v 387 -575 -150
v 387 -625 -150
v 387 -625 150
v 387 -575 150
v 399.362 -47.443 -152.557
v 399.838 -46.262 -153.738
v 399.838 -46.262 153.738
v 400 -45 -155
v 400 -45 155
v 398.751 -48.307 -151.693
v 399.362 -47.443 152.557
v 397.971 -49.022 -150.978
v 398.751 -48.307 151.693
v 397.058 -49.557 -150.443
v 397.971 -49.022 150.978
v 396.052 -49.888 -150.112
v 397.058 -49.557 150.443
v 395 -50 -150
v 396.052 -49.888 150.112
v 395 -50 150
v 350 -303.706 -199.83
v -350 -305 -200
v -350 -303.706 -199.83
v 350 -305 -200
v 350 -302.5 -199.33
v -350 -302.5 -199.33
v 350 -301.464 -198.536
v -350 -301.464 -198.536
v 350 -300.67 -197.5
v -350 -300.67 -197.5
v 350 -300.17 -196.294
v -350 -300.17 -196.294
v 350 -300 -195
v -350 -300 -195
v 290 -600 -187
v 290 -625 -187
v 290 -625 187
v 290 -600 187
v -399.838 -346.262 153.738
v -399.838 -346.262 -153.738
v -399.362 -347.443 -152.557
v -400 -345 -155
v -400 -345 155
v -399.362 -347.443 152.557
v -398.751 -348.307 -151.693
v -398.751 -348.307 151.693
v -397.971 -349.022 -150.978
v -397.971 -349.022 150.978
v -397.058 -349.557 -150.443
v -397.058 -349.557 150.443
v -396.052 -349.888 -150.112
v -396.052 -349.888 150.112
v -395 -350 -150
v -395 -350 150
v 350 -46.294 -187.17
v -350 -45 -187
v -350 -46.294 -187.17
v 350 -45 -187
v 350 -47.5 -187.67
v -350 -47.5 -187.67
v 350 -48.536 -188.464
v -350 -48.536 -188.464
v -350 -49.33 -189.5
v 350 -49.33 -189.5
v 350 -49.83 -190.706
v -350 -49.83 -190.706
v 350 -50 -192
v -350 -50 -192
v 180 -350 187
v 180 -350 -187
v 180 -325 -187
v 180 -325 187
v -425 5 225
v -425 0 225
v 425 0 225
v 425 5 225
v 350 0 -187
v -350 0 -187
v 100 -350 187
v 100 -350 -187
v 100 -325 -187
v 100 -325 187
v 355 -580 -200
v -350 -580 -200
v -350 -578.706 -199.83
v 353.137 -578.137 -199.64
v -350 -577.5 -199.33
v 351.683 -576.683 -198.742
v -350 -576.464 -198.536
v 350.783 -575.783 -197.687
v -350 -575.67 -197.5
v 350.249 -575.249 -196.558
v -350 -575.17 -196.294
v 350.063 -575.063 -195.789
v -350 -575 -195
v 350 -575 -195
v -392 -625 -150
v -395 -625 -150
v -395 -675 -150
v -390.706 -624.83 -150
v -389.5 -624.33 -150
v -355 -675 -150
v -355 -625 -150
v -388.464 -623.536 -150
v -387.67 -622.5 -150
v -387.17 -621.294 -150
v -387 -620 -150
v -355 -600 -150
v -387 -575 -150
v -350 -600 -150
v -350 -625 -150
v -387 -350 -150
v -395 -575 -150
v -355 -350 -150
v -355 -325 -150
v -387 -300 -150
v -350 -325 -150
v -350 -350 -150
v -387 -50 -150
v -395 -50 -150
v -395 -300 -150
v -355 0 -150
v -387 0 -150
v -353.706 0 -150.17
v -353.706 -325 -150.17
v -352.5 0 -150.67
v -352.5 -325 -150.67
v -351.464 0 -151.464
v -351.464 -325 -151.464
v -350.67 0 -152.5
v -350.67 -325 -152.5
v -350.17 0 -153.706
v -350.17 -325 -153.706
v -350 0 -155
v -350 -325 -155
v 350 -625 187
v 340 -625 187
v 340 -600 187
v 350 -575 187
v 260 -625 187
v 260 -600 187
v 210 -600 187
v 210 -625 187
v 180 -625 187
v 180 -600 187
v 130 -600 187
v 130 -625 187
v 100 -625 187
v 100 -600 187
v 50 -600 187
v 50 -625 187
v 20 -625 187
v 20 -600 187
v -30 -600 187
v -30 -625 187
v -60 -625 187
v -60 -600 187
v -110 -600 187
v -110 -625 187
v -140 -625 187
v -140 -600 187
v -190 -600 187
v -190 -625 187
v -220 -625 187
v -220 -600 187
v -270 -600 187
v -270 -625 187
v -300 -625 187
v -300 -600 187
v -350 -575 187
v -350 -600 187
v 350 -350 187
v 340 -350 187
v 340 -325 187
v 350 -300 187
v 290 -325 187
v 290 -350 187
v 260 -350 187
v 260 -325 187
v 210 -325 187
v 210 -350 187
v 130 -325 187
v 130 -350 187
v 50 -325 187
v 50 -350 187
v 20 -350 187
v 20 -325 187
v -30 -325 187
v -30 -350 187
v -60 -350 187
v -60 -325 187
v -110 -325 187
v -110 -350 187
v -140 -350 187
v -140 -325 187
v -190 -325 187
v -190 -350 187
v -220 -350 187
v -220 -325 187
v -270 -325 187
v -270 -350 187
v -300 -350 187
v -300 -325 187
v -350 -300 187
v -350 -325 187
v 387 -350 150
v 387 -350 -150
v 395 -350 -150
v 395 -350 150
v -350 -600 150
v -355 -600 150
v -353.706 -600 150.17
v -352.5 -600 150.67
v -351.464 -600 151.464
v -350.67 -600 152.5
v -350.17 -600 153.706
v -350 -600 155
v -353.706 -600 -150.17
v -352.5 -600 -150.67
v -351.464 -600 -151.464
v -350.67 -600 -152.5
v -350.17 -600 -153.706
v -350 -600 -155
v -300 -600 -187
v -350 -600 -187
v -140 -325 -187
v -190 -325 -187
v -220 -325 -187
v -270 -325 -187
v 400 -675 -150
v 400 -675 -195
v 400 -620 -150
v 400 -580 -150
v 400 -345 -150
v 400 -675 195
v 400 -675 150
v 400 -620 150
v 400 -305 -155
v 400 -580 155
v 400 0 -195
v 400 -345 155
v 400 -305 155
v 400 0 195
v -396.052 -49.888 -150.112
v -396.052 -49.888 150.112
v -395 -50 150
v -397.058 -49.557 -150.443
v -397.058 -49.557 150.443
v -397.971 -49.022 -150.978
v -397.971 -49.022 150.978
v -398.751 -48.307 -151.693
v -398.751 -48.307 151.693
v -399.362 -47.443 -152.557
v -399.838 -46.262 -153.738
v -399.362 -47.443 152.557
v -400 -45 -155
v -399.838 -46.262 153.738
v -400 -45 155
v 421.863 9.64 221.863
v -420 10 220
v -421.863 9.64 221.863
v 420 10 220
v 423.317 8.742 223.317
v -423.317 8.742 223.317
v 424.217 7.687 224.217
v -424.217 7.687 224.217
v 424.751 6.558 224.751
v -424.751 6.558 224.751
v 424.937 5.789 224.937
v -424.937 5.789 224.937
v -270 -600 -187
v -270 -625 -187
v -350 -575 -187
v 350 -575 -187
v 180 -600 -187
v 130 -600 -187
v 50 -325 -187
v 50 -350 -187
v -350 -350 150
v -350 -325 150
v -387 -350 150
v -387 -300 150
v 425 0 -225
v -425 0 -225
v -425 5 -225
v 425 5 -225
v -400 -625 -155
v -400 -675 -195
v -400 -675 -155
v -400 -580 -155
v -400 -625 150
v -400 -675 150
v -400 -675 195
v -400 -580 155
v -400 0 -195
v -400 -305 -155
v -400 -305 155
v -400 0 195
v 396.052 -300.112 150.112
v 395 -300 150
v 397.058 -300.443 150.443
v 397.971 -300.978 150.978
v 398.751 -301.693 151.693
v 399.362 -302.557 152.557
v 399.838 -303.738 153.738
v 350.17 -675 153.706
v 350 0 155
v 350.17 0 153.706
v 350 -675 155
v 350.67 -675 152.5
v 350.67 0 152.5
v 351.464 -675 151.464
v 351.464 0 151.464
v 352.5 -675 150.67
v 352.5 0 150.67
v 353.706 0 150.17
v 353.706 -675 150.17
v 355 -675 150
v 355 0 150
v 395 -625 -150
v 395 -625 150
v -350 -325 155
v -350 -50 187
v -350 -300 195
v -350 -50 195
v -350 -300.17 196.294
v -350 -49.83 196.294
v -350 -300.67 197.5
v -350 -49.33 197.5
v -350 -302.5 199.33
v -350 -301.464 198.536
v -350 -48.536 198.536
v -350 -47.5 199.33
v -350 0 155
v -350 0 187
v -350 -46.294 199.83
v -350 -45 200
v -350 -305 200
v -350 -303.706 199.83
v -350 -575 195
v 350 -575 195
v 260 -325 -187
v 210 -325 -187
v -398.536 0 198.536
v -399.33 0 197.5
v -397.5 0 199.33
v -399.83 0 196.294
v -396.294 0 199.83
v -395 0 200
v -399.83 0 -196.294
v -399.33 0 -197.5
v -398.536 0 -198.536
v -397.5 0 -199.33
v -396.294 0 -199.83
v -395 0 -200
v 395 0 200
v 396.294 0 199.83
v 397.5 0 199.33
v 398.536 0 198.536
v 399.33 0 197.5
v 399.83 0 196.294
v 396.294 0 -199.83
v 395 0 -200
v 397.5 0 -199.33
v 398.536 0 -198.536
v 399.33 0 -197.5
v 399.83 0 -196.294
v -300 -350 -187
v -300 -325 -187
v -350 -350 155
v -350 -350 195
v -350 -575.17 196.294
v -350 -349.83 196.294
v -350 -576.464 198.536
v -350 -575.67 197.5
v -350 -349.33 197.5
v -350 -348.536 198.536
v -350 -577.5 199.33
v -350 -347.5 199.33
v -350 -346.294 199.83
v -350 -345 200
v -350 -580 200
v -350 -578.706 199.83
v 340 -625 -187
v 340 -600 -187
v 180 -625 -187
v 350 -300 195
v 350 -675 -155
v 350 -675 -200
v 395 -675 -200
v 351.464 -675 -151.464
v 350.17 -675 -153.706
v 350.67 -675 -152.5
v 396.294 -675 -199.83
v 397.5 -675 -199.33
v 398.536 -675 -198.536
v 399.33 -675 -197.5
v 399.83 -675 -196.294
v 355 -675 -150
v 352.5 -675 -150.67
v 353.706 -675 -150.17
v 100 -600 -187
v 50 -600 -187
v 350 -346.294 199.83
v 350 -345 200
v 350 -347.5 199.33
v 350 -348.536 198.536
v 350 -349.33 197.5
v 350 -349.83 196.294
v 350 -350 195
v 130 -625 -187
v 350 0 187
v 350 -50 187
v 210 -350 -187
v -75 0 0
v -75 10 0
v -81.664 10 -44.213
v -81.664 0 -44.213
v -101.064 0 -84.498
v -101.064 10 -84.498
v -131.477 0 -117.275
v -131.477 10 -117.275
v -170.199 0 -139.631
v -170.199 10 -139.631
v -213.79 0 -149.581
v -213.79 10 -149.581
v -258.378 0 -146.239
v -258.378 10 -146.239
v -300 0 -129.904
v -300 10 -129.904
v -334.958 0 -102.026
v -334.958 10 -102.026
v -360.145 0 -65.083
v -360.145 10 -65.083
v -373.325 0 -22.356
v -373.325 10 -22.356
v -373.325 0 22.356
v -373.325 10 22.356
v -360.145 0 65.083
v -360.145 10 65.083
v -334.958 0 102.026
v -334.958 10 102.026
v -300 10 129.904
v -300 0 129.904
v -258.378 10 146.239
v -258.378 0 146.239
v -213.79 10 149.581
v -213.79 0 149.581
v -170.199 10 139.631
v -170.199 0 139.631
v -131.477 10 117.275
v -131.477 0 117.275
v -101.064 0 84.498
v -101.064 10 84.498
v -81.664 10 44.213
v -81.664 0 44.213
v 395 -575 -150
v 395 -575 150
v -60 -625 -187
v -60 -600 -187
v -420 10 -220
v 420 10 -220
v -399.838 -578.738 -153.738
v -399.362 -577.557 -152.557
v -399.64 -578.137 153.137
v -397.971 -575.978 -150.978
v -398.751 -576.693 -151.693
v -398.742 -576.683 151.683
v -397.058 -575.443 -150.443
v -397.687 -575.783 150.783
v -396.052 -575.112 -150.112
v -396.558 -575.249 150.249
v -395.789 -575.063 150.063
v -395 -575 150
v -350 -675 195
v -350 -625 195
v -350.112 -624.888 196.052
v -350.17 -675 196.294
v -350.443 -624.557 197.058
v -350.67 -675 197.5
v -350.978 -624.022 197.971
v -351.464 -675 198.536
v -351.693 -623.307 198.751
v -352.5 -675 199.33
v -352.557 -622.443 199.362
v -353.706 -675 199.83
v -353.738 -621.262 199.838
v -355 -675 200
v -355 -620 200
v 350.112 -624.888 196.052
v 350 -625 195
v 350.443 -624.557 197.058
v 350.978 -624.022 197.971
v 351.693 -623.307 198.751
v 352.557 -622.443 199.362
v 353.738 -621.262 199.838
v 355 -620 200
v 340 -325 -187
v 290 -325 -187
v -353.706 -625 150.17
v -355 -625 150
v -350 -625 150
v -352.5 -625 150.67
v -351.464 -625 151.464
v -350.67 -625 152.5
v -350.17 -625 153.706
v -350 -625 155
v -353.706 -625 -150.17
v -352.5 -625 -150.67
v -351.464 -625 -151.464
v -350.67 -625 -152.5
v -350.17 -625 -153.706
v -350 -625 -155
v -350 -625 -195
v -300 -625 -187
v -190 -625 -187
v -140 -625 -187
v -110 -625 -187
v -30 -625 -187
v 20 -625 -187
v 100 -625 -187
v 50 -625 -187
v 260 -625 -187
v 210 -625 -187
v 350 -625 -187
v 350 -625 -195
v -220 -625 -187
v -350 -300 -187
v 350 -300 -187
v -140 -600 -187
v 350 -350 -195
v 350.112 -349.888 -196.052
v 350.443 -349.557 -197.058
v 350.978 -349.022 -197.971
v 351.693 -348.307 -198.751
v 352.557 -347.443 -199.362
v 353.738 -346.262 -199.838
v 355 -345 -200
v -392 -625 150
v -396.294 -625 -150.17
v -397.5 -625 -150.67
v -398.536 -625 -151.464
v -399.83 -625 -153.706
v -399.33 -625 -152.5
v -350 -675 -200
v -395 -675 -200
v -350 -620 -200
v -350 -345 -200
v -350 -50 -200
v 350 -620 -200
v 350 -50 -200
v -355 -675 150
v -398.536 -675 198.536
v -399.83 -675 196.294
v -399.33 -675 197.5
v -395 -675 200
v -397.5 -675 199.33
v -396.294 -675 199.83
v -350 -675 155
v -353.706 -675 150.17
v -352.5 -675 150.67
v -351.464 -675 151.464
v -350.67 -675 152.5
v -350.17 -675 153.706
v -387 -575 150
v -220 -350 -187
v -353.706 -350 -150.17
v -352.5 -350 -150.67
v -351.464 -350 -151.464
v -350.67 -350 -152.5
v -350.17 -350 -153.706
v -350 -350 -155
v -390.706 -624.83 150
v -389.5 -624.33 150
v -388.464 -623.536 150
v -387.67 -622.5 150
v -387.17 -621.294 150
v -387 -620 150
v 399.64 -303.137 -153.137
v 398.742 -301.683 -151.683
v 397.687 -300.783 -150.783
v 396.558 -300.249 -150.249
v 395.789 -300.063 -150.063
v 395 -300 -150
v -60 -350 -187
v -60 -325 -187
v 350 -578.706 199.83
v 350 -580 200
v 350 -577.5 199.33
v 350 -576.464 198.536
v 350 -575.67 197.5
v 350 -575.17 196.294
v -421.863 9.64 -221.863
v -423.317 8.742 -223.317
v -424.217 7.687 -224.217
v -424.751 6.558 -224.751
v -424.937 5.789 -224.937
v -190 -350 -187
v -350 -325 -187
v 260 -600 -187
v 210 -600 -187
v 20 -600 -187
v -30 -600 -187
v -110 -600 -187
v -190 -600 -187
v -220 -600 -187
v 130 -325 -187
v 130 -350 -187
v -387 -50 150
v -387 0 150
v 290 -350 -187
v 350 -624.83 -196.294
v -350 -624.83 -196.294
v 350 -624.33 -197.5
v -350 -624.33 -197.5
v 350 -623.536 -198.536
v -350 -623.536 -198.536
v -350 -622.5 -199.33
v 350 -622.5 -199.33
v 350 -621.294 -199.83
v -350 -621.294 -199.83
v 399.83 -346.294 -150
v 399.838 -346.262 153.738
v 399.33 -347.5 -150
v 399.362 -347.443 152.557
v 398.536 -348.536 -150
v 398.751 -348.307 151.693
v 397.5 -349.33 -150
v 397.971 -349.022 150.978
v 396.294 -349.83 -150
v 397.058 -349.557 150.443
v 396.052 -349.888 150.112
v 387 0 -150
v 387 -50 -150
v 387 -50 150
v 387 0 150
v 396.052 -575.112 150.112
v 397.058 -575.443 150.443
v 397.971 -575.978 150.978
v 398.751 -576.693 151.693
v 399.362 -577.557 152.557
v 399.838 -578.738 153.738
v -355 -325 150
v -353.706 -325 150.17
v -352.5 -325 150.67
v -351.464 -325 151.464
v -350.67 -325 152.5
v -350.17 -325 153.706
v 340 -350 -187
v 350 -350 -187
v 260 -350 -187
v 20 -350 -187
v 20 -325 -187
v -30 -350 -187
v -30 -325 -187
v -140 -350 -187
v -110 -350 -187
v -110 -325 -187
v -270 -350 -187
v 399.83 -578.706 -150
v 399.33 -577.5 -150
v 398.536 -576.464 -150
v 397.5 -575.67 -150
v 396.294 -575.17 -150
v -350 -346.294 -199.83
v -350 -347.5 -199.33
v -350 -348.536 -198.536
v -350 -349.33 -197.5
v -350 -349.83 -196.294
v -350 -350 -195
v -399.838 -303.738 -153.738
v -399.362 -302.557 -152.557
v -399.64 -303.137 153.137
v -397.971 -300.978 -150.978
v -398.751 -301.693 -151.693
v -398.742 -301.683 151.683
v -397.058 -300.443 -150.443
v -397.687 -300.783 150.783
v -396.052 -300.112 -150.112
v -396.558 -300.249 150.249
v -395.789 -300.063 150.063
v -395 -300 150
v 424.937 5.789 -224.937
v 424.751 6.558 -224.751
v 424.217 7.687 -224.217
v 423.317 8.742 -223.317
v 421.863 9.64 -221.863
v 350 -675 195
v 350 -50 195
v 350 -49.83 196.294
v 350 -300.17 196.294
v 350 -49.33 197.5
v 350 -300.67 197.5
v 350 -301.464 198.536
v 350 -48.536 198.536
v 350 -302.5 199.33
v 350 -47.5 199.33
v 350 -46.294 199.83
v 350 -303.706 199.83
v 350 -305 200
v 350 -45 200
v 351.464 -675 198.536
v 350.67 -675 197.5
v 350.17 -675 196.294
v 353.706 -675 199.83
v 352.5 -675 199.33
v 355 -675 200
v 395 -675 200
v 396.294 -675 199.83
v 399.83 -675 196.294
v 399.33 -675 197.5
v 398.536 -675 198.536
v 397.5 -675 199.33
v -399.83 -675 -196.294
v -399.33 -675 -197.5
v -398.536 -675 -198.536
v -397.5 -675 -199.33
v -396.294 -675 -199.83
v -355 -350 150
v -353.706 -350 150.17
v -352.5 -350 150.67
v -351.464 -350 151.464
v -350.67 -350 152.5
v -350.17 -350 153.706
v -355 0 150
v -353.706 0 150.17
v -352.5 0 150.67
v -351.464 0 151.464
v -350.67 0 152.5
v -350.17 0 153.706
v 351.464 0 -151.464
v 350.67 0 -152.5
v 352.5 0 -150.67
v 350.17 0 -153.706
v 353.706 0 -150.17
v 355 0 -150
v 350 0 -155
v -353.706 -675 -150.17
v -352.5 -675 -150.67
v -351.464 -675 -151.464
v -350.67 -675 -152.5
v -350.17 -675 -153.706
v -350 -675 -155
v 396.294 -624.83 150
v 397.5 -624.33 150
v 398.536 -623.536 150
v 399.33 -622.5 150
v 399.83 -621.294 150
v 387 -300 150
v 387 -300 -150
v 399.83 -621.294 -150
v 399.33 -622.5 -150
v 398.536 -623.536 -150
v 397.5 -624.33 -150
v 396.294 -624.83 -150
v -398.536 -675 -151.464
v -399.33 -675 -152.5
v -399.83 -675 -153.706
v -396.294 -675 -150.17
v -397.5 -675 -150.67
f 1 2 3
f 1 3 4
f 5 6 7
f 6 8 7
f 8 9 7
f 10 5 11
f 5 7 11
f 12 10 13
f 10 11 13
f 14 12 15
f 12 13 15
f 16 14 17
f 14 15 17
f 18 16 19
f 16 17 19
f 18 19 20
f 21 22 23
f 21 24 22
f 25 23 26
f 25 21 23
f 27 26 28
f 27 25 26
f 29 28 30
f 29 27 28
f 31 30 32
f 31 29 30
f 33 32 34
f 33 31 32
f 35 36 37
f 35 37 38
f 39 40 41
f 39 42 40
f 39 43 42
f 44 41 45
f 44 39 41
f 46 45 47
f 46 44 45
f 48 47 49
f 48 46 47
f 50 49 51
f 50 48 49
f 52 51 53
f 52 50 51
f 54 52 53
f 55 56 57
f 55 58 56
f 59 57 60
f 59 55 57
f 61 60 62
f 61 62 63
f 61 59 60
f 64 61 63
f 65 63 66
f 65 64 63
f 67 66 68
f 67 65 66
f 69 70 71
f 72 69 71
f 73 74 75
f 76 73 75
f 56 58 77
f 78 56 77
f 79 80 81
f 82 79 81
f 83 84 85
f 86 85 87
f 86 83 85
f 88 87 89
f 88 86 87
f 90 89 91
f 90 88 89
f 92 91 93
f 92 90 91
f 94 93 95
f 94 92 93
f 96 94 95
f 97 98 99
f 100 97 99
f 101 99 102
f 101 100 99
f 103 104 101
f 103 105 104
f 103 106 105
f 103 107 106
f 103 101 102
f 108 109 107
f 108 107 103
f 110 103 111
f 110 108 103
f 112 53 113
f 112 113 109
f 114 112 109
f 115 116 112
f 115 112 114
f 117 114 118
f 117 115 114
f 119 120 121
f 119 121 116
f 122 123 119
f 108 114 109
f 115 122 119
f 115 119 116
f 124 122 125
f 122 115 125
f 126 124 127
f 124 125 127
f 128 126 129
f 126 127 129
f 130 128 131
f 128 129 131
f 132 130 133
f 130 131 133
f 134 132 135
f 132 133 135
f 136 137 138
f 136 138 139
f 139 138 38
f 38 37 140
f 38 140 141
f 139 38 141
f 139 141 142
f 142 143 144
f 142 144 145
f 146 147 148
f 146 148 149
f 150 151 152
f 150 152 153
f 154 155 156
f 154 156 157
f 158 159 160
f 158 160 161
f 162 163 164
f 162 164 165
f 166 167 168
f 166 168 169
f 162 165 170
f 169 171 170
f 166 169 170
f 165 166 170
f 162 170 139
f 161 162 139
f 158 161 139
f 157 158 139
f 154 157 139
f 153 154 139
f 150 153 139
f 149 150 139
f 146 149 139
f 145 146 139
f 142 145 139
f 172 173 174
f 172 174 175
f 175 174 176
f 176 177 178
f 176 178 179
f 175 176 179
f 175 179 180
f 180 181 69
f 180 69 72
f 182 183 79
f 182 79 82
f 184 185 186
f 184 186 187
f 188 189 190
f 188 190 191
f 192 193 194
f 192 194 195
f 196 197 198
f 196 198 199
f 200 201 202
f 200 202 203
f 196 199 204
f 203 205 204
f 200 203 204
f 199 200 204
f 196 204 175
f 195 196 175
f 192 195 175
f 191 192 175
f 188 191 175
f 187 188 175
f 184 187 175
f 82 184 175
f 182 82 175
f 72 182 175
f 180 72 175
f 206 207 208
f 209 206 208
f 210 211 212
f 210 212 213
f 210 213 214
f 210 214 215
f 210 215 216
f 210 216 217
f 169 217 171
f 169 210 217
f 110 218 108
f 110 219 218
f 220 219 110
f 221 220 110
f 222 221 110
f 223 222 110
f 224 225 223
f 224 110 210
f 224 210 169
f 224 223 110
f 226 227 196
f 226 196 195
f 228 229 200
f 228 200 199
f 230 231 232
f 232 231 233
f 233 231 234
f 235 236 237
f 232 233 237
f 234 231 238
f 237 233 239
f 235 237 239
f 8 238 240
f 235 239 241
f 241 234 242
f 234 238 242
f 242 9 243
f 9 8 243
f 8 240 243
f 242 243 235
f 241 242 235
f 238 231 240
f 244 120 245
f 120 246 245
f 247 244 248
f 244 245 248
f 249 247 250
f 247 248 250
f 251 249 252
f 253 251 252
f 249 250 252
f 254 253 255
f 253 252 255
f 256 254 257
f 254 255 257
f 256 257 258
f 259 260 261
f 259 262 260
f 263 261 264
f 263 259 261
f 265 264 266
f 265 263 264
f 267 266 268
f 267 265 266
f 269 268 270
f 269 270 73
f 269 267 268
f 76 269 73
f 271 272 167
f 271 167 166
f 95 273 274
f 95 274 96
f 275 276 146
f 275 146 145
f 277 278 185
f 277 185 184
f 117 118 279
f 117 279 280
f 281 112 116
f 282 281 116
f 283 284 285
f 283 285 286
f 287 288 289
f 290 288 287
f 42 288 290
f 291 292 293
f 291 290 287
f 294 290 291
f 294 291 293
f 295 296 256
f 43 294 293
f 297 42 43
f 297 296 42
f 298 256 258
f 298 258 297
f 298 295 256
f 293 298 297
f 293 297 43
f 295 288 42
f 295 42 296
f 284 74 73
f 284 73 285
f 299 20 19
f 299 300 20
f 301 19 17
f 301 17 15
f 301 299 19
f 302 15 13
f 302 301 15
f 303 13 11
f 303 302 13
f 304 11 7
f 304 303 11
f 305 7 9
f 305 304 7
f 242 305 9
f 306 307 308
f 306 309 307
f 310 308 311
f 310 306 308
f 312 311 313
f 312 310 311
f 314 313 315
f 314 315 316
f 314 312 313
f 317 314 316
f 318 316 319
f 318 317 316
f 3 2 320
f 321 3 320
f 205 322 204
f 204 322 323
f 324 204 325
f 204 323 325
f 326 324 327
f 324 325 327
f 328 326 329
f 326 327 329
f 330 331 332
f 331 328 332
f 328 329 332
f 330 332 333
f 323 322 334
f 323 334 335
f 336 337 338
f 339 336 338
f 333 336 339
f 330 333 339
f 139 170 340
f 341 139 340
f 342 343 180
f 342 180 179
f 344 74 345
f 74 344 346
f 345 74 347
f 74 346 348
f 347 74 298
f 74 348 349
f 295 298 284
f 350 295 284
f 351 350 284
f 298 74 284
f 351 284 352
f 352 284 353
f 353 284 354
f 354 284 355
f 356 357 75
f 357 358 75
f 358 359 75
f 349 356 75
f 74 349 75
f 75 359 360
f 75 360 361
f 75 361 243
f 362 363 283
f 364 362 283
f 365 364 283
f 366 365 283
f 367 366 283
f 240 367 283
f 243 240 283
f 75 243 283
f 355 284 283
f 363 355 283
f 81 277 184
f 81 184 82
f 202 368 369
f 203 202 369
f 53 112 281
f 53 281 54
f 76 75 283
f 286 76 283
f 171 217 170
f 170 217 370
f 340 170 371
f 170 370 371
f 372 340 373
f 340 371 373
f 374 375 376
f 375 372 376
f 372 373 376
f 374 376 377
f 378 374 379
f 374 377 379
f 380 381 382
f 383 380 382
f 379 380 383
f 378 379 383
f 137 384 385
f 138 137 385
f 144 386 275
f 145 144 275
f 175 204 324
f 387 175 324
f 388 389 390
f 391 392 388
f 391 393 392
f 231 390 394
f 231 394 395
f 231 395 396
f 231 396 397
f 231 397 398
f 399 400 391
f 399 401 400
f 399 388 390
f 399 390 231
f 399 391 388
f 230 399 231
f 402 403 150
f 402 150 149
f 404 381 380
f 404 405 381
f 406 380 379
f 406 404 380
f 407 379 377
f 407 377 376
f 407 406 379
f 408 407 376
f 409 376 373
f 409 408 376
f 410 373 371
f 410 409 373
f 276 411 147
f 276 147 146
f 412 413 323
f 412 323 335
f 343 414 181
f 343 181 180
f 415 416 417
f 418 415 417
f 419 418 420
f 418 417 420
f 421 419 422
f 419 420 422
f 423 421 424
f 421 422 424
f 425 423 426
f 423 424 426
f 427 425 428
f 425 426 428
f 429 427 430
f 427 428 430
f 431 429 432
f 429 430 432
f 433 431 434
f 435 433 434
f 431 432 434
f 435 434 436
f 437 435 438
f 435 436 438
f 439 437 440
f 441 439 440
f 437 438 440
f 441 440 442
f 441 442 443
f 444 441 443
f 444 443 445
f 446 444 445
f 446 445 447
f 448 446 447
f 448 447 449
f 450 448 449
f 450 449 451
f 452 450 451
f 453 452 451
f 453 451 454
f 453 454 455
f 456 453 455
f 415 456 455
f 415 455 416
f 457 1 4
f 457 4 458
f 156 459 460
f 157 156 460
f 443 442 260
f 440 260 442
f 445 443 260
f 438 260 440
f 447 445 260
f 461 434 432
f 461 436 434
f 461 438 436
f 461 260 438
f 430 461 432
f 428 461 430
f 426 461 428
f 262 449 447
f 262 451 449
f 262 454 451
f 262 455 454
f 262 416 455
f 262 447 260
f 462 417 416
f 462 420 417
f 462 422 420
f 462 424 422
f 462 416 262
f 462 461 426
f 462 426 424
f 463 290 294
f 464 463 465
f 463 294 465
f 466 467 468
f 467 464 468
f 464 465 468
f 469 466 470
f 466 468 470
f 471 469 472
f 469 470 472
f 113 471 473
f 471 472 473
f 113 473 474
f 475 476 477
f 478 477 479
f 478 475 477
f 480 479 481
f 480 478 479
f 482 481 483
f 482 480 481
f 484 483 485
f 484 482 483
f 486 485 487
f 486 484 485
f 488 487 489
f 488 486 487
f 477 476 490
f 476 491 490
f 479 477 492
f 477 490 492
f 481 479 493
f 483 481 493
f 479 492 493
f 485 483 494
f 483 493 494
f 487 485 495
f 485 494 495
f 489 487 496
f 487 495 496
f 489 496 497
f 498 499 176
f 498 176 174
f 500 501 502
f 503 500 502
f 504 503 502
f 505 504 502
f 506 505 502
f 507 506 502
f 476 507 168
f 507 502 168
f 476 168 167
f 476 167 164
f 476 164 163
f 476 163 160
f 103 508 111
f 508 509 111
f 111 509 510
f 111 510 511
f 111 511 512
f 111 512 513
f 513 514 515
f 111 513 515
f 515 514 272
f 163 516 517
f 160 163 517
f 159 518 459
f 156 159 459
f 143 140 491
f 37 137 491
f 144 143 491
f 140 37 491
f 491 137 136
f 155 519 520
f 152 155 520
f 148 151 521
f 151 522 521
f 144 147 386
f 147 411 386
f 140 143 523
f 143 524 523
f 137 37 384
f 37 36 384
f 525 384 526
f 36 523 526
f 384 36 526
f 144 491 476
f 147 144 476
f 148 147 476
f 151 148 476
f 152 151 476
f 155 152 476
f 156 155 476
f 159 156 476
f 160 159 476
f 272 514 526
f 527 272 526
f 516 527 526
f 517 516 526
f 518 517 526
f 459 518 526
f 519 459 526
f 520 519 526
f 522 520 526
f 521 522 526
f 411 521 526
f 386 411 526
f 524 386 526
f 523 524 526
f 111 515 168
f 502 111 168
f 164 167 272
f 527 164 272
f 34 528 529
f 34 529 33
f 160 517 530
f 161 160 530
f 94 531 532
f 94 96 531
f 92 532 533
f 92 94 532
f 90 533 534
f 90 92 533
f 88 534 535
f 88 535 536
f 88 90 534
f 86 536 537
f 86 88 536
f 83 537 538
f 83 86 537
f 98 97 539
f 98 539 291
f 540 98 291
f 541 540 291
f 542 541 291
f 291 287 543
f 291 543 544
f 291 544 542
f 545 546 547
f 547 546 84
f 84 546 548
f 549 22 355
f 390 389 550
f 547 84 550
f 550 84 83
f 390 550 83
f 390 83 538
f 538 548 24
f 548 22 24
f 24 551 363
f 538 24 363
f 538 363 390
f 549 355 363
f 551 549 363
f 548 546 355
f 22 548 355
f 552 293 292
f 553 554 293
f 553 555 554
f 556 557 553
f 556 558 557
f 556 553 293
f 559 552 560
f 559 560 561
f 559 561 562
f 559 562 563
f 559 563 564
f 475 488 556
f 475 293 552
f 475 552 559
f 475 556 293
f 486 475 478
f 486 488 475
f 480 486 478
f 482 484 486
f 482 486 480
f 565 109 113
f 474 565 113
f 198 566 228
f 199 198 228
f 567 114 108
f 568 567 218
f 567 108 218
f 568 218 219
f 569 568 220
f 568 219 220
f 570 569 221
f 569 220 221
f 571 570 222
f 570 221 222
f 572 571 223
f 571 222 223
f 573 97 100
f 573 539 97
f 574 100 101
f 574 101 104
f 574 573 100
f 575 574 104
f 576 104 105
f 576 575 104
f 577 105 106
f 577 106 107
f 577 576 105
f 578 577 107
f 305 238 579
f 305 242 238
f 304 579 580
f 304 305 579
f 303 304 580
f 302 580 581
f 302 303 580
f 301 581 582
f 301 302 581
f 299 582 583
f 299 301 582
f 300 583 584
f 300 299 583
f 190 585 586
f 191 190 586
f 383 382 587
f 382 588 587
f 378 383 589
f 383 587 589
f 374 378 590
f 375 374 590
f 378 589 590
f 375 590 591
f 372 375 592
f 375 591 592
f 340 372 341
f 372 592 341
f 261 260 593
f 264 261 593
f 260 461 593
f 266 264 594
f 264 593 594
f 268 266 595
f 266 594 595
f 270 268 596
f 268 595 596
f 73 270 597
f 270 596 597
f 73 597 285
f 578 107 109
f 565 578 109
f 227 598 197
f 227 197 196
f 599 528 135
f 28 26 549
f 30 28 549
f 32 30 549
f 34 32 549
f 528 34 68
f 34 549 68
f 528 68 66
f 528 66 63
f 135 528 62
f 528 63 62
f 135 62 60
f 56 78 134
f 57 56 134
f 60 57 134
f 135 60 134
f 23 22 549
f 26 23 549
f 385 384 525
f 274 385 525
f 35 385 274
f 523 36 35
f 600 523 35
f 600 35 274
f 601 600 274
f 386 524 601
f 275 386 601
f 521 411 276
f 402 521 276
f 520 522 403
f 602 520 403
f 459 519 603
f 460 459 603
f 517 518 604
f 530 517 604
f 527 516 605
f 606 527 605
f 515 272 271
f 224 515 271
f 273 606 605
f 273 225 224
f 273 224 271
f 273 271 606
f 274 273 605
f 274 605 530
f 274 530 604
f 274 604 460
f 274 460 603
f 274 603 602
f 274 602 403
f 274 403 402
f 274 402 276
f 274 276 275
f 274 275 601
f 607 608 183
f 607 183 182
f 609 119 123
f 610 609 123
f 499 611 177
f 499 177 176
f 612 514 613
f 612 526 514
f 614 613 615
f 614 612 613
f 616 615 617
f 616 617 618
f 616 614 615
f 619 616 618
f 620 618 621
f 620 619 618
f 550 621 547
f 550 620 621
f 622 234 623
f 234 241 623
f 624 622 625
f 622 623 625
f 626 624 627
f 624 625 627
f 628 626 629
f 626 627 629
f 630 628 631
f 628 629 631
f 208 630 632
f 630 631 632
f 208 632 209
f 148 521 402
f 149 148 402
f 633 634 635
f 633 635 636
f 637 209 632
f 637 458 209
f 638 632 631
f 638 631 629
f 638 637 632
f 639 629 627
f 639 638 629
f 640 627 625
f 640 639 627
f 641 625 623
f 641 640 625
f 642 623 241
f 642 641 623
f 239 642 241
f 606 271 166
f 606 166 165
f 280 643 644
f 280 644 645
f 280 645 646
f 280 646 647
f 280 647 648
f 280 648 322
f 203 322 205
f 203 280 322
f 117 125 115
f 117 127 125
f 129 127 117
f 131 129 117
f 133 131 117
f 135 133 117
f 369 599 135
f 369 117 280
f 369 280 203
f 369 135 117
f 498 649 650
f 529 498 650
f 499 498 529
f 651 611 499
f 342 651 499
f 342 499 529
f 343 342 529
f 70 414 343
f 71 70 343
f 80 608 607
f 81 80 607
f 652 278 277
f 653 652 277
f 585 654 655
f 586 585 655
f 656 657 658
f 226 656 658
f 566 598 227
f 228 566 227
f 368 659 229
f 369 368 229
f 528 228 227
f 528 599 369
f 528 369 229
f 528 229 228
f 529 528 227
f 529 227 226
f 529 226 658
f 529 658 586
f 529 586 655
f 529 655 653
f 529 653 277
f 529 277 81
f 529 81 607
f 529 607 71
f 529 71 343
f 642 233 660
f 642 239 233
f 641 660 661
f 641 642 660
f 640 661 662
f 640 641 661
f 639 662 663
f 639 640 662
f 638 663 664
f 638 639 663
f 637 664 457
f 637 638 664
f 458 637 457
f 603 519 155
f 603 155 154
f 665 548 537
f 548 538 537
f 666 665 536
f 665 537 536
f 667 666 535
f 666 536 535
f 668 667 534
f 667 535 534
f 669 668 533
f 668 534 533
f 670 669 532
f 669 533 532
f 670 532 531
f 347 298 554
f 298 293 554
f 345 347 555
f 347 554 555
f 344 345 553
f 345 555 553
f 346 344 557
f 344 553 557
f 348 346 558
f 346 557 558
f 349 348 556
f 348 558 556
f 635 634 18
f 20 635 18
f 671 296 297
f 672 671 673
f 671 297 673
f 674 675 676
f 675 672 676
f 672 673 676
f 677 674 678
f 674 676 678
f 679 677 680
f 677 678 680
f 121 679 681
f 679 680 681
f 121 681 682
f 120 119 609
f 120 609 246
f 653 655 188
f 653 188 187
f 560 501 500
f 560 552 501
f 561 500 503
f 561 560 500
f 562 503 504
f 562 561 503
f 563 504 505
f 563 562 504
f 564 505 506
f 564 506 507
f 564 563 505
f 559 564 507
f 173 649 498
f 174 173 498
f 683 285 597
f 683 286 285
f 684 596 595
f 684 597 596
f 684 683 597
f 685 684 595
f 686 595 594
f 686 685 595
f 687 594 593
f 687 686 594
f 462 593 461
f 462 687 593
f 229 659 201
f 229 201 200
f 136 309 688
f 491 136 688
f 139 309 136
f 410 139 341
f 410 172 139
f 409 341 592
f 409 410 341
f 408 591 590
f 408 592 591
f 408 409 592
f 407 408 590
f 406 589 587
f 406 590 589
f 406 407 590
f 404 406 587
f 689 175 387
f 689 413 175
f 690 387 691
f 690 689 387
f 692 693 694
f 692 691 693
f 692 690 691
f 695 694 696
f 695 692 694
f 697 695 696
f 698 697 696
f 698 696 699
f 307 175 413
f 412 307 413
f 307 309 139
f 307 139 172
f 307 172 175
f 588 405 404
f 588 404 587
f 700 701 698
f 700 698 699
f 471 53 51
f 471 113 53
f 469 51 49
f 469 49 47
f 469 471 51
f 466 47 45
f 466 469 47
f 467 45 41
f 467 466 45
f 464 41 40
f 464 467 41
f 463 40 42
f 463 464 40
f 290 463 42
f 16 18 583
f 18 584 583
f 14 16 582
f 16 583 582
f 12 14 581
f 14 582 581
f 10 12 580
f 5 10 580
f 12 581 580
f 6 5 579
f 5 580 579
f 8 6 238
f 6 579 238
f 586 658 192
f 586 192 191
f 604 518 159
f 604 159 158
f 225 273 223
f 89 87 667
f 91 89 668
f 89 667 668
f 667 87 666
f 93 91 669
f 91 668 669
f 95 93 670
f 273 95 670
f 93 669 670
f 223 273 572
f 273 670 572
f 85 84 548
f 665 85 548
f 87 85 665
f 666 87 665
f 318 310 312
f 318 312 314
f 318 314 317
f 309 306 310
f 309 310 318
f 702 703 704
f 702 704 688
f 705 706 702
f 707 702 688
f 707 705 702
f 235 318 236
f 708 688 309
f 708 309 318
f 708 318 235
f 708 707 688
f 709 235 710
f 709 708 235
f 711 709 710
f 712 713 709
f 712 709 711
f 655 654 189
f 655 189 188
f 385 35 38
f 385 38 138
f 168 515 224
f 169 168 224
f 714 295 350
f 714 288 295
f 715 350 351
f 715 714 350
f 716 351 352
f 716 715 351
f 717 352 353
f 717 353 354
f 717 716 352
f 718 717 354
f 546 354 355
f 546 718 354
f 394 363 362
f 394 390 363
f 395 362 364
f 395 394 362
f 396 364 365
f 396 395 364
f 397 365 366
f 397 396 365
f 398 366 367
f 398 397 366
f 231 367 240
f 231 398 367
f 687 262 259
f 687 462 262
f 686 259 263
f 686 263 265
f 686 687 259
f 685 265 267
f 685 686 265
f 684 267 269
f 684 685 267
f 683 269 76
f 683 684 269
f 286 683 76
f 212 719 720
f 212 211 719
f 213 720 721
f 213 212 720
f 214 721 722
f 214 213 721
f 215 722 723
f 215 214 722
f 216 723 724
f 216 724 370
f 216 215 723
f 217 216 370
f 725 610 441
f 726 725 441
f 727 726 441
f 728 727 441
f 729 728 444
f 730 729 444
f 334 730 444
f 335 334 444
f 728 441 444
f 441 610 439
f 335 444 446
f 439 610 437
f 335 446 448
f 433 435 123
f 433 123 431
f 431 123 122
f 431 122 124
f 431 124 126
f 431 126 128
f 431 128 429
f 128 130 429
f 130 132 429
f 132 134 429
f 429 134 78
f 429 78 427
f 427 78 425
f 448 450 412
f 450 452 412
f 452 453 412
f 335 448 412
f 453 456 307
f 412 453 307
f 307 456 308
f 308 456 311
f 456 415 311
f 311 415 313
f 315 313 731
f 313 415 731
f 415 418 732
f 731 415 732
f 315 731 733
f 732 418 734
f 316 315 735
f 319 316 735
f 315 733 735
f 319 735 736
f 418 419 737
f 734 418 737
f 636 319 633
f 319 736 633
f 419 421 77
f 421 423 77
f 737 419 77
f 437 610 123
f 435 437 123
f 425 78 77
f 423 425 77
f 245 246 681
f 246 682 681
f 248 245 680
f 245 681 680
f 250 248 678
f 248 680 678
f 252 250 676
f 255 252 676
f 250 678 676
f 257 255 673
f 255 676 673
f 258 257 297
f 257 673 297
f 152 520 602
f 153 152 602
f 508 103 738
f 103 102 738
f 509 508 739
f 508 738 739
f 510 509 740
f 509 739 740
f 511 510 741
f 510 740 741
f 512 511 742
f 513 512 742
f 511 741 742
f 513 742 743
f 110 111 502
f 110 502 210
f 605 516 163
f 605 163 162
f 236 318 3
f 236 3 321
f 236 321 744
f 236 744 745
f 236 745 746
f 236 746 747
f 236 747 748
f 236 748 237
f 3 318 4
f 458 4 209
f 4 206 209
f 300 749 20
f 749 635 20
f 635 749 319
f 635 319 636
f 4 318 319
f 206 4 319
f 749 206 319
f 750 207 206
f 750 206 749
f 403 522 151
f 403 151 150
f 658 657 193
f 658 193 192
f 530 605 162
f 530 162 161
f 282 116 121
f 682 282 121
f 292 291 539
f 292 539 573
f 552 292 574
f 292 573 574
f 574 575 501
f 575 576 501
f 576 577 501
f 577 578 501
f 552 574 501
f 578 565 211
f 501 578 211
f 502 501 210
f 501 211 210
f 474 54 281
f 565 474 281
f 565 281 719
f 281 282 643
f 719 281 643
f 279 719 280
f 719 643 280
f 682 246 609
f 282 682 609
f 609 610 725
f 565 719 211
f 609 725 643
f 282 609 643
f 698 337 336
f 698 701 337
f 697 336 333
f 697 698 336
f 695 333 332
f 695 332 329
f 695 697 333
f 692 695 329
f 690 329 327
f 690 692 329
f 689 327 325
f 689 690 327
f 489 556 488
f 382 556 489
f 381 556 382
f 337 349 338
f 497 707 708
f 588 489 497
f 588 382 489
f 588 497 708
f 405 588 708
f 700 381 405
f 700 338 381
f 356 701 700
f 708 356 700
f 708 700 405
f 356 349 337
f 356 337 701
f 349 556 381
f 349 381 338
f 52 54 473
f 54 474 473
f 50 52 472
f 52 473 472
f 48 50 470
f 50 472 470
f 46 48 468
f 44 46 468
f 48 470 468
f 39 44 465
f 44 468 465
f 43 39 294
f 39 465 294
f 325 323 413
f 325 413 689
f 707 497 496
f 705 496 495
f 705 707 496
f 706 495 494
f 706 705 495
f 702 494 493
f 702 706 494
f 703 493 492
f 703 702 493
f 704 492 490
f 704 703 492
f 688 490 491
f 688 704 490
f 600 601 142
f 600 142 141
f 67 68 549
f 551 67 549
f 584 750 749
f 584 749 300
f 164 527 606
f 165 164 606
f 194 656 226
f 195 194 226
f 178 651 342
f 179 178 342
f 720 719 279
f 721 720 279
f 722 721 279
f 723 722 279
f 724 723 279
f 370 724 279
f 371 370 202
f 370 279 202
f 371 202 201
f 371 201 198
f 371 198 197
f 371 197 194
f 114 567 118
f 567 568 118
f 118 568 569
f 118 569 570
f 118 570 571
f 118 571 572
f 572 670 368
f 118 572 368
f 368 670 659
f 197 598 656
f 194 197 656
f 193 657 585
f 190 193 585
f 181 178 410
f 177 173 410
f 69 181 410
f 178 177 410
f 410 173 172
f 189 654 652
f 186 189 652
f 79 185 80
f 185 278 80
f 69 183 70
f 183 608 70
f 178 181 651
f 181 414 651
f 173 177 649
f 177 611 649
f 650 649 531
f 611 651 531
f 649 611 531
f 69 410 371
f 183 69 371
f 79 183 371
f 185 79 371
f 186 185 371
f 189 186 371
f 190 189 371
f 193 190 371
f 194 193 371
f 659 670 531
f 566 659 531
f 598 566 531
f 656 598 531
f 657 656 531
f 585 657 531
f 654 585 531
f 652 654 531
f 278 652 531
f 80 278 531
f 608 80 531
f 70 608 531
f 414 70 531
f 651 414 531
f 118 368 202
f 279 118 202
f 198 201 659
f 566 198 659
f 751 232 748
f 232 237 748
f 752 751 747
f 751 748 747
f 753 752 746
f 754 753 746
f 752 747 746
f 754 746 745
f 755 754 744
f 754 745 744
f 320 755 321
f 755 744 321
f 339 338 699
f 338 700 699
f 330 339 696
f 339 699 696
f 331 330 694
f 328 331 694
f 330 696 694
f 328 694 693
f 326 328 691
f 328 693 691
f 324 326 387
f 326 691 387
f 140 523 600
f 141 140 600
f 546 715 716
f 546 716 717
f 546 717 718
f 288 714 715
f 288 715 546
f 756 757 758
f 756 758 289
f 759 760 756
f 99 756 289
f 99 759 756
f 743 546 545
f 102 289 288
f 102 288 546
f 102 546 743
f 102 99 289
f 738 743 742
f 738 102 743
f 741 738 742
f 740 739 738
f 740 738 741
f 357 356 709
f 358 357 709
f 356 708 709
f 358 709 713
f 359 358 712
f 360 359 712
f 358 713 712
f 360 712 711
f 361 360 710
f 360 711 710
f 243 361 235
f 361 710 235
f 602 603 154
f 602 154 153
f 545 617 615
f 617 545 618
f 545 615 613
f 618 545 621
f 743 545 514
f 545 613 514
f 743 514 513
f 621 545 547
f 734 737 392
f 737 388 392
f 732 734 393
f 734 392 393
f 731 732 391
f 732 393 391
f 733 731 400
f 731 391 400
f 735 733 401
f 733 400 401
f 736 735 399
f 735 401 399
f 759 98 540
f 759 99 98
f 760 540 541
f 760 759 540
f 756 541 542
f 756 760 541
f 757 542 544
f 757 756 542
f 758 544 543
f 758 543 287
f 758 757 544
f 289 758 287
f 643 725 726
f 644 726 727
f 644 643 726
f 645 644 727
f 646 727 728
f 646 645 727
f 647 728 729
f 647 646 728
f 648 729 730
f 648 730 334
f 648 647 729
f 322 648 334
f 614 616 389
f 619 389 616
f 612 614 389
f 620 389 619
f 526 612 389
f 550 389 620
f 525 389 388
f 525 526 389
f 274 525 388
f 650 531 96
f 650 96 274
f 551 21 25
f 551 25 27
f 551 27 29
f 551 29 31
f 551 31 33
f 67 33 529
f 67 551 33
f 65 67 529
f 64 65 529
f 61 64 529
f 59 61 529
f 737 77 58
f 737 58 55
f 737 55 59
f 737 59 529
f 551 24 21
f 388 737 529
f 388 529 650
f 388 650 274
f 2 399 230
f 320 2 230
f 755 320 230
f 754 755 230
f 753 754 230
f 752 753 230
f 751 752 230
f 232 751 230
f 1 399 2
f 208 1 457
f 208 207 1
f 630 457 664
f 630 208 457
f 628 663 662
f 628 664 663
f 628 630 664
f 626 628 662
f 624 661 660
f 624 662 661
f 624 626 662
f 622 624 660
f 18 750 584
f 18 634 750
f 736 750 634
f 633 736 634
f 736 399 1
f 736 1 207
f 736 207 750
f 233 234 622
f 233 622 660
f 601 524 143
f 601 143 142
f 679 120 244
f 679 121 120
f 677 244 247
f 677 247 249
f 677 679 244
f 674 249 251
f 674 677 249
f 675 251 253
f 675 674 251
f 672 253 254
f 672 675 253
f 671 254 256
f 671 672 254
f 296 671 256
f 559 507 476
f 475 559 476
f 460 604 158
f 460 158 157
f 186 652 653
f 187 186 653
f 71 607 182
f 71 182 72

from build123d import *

# Parameters (mm, degrees)
SKETCH1_W           = 850
SKETCH1_H           = 450
BOSS_EXTRUDE1_DEPTH = 10
SKETCH2_W           = 50
SKETCH2_H           = 50
BOSS_EXTRUDE2_DEPTH = 675
BOSS_EXTRUDE3_REACH = 777
SKETCH3_W           = 13
SKETCH3_H           = 50
BOSS_EXTRUDE4_REACH = 377
SKETCH4_W           = 13
SKETCH4_H           = 50
SKETCH5_W           = 50
SKETCH5_H           = 25
BOSS_EXTRUDE5_DEPTH = 374
SKETCH6_W           = 50
SKETCH6_H           = 25
BOSS_EXTRUDE6_DEPTH = 374
LPATTERN2_COUNT     = 9
LPATTERN2_PITCH     = 80
LPATTERN3_COUNT     = 9
LPATTERN3_PITCH     = 80
CUT_EXTRUDE1_REACH  = 687
SKETCH7_R           = 150
FILLET2_R           = 5
FILLET3_R           = 5


with BuildPart() as part:
    # Sketch1 → Boss-Extrude1 (new body)
    with BuildSketch(Plane(origin=(0, 0, 0), x_dir=(1, 0, 0), z_dir=(0, 1, 0))):
        Rectangle(SKETCH1_W, SKETCH1_H)
    extrude(amount=BOSS_EXTRUDE1_DEPTH)

    # Sketch2 → Boss-Extrude2 (add)
    with BuildSketch(Plane.XZ):
        with Locations((-375, -175)):
            Rectangle(SKETCH2_W, SKETCH2_H)
        with Locations((-375, 175)):
            Rectangle(SKETCH2_W, SKETCH2_H)
        with Locations((375, 175)):
            Rectangle(SKETCH2_W, SKETCH2_H)
        with Locations((375, -175)):
            Rectangle(SKETCH2_W, SKETCH2_H)
    extrude(amount=BOSS_EXTRUDE2_DEPTH)

    # Sketch3 → Boss-Extrude3 (add, up to next)
    with BuildSketch(Plane(origin=(-350, 0, 0), x_dir=(0, 0, -1), z_dir=(1, 0, 0)), mode=Mode.PRIVATE) as boss_extrude3_sk1:
        with Locations((193.5, -600)):
            Rectangle(SKETCH3_W, SKETCH3_H)
    boss_extrude3_tool1 = extrude(boss_extrude3_sk1.sketch, amount=BOSS_EXTRUDE3_REACH, mode=Mode.PRIVATE) - part.part
    add(boss_extrude3_tool1.solids().sort_by_distance((-350, -600, -193.5))[0])
    # Sketch3 → Boss-Extrude3 (add, up to next)
    with BuildSketch(Plane(origin=(-350, 0, 0), x_dir=(0, 0, -1), z_dir=(1, 0, 0)), mode=Mode.PRIVATE) as boss_extrude3_sk2:
        with Locations((193.5, -325)):
            Rectangle(SKETCH3_W, SKETCH3_H)
    boss_extrude3_tool2 = extrude(boss_extrude3_sk2.sketch, amount=BOSS_EXTRUDE3_REACH, mode=Mode.PRIVATE) - part.part
    add(boss_extrude3_tool2.solids().sort_by_distance((-350, -325, -193.5))[0])
    # Sketch3 → Boss-Extrude3 (add, up to next)
    with BuildSketch(Plane(origin=(-350, 0, 0), x_dir=(0, 0, -1), z_dir=(1, 0, 0)), mode=Mode.PRIVATE) as boss_extrude3_sk3:
        with Locations((193.5, -25)):
            Rectangle(SKETCH3_W, SKETCH3_H)
    boss_extrude3_tool3 = extrude(boss_extrude3_sk3.sketch, amount=BOSS_EXTRUDE3_REACH, mode=Mode.PRIVATE) - part.part
    add(boss_extrude3_tool3.solids().sort_by_distance((-350, -25, -193.5))[0])

    # Mirror1: part across plane


with BuildPart() as part_1:
    add(part.part)
    add(part.part.mirror(Plane.XY))

    # Sketch4 → Boss-Extrude4 (add, up to next)
    with BuildSketch(Plane.XY.offset(-150), mode=Mode.PRIVATE) as boss_extrude4_sk1:
        with Locations((393.5, -600)):
            Rectangle(SKETCH4_W, SKETCH4_H)
    boss_extrude4_tool1 = extrude(boss_extrude4_sk1.sketch, amount=BOSS_EXTRUDE4_REACH, mode=Mode.PRIVATE) - part_1.part
    add(boss_extrude4_tool1.solids().sort_by_distance((393.5, -600, -150))[0])
    # Sketch4 → Boss-Extrude4 (add, up to next)
    with BuildSketch(Plane.XY.offset(-150), mode=Mode.PRIVATE) as boss_extrude4_sk2:
        with Locations((393.5, -325)):
            Rectangle(SKETCH4_W, SKETCH4_H)
    boss_extrude4_tool2 = extrude(boss_extrude4_sk2.sketch, amount=BOSS_EXTRUDE4_REACH, mode=Mode.PRIVATE) - part_1.part
    add(boss_extrude4_tool2.solids().sort_by_distance((393.5, -325, -150))[0])
    # Sketch4 → Boss-Extrude4 (add, up to next)
    with BuildSketch(Plane.XY.offset(-150), mode=Mode.PRIVATE) as boss_extrude4_sk3:
        with Locations((393.5, -25)):
            Rectangle(SKETCH4_W, SKETCH4_H)
    boss_extrude4_tool3 = extrude(boss_extrude4_sk3.sketch, amount=BOSS_EXTRUDE4_REACH, mode=Mode.PRIVATE) - part_1.part
    add(boss_extrude4_tool3.solids().sort_by_distance((393.5, -25, -150))[0])

    # Mirror2: part across plane


with BuildPart() as part_2:
    add(part_1.part)
    add(part_1.part.mirror(Plane(origin=(0, 0, 0), x_dir=(0, 0, 1), z_dir=(1, 0, 0))))

    # Sketch5 → Boss-Extrude5 (add)
    with BuildSketch(Plane.XY.offset(-187)):
        with Locations((-325, -337.5)):
            Rectangle(SKETCH5_W, SKETCH5_H)
    boss_extrude5 = extrude(amount=BOSS_EXTRUDE5_DEPTH)

    # Sketch6 → Boss-Extrude6 (add)
    with BuildSketch(Plane.XY.offset(-187)):
        with Locations((-325, -612.5)):
            Rectangle(SKETCH6_W, SKETCH6_H)
    boss_extrude6 = extrude(amount=BOSS_EXTRUDE6_DEPTH)

    # LPattern2: Boss-Extrude5 ×9
    with Locations(*[(i * LPATTERN2_PITCH, 0, 0) for i in range(1, LPATTERN2_COUNT)]):
        add(boss_extrude5)

    # LPattern3: Boss-Extrude6 ×9
    with Locations(*[(i * LPATTERN3_PITCH, 0, 0) for i in range(1, LPATTERN3_COUNT)]):
        add(boss_extrude6)

    # Sketch7 → Cut-Extrude1 (cut, up to next)
    with BuildSketch(Plane(origin=(0, 10, 0), x_dir=(1, 0, 0), z_dir=(0, 1, 0)), mode=Mode.PRIVATE) as cut_extrude1_sk1:
        with Locations((-225, 0)):
            Circle(SKETCH7_R)
    cut_extrude1_tool1 = extrude(cut_extrude1_sk1.sketch, amount=-CUT_EXTRUDE1_REACH, mode=Mode.PRIVATE) & part_2.part
    add(cut_extrude1_tool1.solids().sort_by_distance((-225, 10, 0))[0], mode=Mode.SUBTRACT)

    # Fillet2
    fillet2_edges = [part_2.edges().sort_by_distance(p)[0] for p in [
        (-400, -337.5, 200),
        (-350, -650, 200),
        (0, -625, 200),
        (350, -650, 200),
        (400, -337.5, 200),
        (0, -50, 200),
        (0, -300, 200),
        (0, -350, 200),
        (0, -575, 200),
        (-400, -175, -150),
        (-400, -300, 0),
        (-400, -175, 150),
        (-400, -50, 0),
        (-400, -462.5, -150),
        (-400, -575, 0),
        (-400, -462.5, 150),
        (-400, -350, 0),
        (-400, -650, -150),
        (-400, -337.5, -200),
        (400, -337.5, -200),
        (0, -625, -200),
        (0, -575, -200),
        (350, -462.5, -200),
        (0, -350, -200),
        (0, -300, -200),
        (400, -625, 0),
        (400, -462.5, 150),
        (400, -575, 0),
        (400, -350, 0),
        (400, -175, 150),
        (400, -300, 0),
        (400, -175, -150),
        (400, -50, 0),
        (-350, -650, 150),
        (350, -337.5, 150),
        (-350, -162.5, 150),
        (-350, -475, 150),
        (-350, -162.5, -150),
        (-350, -475, -150),
        (-350, -650, -150),
        (-387, -625, 0),
        (350, -337.5, -150),
        (0, -50, -187),
    ]]
    fillet(fillet2_edges, radius=FILLET2_R)

    # Fillet3
    fillet3_edges = [part_2.edges().sort_by_distance(p)[0] for p in [
        (-425, 10, 0),
        (0, 10, 225),
        (425, 10, 0),
        (0, 10, -225),
    ]]
    fillet(fillet3_edges, radius=FILLET3_R)


solid = part_2.part
